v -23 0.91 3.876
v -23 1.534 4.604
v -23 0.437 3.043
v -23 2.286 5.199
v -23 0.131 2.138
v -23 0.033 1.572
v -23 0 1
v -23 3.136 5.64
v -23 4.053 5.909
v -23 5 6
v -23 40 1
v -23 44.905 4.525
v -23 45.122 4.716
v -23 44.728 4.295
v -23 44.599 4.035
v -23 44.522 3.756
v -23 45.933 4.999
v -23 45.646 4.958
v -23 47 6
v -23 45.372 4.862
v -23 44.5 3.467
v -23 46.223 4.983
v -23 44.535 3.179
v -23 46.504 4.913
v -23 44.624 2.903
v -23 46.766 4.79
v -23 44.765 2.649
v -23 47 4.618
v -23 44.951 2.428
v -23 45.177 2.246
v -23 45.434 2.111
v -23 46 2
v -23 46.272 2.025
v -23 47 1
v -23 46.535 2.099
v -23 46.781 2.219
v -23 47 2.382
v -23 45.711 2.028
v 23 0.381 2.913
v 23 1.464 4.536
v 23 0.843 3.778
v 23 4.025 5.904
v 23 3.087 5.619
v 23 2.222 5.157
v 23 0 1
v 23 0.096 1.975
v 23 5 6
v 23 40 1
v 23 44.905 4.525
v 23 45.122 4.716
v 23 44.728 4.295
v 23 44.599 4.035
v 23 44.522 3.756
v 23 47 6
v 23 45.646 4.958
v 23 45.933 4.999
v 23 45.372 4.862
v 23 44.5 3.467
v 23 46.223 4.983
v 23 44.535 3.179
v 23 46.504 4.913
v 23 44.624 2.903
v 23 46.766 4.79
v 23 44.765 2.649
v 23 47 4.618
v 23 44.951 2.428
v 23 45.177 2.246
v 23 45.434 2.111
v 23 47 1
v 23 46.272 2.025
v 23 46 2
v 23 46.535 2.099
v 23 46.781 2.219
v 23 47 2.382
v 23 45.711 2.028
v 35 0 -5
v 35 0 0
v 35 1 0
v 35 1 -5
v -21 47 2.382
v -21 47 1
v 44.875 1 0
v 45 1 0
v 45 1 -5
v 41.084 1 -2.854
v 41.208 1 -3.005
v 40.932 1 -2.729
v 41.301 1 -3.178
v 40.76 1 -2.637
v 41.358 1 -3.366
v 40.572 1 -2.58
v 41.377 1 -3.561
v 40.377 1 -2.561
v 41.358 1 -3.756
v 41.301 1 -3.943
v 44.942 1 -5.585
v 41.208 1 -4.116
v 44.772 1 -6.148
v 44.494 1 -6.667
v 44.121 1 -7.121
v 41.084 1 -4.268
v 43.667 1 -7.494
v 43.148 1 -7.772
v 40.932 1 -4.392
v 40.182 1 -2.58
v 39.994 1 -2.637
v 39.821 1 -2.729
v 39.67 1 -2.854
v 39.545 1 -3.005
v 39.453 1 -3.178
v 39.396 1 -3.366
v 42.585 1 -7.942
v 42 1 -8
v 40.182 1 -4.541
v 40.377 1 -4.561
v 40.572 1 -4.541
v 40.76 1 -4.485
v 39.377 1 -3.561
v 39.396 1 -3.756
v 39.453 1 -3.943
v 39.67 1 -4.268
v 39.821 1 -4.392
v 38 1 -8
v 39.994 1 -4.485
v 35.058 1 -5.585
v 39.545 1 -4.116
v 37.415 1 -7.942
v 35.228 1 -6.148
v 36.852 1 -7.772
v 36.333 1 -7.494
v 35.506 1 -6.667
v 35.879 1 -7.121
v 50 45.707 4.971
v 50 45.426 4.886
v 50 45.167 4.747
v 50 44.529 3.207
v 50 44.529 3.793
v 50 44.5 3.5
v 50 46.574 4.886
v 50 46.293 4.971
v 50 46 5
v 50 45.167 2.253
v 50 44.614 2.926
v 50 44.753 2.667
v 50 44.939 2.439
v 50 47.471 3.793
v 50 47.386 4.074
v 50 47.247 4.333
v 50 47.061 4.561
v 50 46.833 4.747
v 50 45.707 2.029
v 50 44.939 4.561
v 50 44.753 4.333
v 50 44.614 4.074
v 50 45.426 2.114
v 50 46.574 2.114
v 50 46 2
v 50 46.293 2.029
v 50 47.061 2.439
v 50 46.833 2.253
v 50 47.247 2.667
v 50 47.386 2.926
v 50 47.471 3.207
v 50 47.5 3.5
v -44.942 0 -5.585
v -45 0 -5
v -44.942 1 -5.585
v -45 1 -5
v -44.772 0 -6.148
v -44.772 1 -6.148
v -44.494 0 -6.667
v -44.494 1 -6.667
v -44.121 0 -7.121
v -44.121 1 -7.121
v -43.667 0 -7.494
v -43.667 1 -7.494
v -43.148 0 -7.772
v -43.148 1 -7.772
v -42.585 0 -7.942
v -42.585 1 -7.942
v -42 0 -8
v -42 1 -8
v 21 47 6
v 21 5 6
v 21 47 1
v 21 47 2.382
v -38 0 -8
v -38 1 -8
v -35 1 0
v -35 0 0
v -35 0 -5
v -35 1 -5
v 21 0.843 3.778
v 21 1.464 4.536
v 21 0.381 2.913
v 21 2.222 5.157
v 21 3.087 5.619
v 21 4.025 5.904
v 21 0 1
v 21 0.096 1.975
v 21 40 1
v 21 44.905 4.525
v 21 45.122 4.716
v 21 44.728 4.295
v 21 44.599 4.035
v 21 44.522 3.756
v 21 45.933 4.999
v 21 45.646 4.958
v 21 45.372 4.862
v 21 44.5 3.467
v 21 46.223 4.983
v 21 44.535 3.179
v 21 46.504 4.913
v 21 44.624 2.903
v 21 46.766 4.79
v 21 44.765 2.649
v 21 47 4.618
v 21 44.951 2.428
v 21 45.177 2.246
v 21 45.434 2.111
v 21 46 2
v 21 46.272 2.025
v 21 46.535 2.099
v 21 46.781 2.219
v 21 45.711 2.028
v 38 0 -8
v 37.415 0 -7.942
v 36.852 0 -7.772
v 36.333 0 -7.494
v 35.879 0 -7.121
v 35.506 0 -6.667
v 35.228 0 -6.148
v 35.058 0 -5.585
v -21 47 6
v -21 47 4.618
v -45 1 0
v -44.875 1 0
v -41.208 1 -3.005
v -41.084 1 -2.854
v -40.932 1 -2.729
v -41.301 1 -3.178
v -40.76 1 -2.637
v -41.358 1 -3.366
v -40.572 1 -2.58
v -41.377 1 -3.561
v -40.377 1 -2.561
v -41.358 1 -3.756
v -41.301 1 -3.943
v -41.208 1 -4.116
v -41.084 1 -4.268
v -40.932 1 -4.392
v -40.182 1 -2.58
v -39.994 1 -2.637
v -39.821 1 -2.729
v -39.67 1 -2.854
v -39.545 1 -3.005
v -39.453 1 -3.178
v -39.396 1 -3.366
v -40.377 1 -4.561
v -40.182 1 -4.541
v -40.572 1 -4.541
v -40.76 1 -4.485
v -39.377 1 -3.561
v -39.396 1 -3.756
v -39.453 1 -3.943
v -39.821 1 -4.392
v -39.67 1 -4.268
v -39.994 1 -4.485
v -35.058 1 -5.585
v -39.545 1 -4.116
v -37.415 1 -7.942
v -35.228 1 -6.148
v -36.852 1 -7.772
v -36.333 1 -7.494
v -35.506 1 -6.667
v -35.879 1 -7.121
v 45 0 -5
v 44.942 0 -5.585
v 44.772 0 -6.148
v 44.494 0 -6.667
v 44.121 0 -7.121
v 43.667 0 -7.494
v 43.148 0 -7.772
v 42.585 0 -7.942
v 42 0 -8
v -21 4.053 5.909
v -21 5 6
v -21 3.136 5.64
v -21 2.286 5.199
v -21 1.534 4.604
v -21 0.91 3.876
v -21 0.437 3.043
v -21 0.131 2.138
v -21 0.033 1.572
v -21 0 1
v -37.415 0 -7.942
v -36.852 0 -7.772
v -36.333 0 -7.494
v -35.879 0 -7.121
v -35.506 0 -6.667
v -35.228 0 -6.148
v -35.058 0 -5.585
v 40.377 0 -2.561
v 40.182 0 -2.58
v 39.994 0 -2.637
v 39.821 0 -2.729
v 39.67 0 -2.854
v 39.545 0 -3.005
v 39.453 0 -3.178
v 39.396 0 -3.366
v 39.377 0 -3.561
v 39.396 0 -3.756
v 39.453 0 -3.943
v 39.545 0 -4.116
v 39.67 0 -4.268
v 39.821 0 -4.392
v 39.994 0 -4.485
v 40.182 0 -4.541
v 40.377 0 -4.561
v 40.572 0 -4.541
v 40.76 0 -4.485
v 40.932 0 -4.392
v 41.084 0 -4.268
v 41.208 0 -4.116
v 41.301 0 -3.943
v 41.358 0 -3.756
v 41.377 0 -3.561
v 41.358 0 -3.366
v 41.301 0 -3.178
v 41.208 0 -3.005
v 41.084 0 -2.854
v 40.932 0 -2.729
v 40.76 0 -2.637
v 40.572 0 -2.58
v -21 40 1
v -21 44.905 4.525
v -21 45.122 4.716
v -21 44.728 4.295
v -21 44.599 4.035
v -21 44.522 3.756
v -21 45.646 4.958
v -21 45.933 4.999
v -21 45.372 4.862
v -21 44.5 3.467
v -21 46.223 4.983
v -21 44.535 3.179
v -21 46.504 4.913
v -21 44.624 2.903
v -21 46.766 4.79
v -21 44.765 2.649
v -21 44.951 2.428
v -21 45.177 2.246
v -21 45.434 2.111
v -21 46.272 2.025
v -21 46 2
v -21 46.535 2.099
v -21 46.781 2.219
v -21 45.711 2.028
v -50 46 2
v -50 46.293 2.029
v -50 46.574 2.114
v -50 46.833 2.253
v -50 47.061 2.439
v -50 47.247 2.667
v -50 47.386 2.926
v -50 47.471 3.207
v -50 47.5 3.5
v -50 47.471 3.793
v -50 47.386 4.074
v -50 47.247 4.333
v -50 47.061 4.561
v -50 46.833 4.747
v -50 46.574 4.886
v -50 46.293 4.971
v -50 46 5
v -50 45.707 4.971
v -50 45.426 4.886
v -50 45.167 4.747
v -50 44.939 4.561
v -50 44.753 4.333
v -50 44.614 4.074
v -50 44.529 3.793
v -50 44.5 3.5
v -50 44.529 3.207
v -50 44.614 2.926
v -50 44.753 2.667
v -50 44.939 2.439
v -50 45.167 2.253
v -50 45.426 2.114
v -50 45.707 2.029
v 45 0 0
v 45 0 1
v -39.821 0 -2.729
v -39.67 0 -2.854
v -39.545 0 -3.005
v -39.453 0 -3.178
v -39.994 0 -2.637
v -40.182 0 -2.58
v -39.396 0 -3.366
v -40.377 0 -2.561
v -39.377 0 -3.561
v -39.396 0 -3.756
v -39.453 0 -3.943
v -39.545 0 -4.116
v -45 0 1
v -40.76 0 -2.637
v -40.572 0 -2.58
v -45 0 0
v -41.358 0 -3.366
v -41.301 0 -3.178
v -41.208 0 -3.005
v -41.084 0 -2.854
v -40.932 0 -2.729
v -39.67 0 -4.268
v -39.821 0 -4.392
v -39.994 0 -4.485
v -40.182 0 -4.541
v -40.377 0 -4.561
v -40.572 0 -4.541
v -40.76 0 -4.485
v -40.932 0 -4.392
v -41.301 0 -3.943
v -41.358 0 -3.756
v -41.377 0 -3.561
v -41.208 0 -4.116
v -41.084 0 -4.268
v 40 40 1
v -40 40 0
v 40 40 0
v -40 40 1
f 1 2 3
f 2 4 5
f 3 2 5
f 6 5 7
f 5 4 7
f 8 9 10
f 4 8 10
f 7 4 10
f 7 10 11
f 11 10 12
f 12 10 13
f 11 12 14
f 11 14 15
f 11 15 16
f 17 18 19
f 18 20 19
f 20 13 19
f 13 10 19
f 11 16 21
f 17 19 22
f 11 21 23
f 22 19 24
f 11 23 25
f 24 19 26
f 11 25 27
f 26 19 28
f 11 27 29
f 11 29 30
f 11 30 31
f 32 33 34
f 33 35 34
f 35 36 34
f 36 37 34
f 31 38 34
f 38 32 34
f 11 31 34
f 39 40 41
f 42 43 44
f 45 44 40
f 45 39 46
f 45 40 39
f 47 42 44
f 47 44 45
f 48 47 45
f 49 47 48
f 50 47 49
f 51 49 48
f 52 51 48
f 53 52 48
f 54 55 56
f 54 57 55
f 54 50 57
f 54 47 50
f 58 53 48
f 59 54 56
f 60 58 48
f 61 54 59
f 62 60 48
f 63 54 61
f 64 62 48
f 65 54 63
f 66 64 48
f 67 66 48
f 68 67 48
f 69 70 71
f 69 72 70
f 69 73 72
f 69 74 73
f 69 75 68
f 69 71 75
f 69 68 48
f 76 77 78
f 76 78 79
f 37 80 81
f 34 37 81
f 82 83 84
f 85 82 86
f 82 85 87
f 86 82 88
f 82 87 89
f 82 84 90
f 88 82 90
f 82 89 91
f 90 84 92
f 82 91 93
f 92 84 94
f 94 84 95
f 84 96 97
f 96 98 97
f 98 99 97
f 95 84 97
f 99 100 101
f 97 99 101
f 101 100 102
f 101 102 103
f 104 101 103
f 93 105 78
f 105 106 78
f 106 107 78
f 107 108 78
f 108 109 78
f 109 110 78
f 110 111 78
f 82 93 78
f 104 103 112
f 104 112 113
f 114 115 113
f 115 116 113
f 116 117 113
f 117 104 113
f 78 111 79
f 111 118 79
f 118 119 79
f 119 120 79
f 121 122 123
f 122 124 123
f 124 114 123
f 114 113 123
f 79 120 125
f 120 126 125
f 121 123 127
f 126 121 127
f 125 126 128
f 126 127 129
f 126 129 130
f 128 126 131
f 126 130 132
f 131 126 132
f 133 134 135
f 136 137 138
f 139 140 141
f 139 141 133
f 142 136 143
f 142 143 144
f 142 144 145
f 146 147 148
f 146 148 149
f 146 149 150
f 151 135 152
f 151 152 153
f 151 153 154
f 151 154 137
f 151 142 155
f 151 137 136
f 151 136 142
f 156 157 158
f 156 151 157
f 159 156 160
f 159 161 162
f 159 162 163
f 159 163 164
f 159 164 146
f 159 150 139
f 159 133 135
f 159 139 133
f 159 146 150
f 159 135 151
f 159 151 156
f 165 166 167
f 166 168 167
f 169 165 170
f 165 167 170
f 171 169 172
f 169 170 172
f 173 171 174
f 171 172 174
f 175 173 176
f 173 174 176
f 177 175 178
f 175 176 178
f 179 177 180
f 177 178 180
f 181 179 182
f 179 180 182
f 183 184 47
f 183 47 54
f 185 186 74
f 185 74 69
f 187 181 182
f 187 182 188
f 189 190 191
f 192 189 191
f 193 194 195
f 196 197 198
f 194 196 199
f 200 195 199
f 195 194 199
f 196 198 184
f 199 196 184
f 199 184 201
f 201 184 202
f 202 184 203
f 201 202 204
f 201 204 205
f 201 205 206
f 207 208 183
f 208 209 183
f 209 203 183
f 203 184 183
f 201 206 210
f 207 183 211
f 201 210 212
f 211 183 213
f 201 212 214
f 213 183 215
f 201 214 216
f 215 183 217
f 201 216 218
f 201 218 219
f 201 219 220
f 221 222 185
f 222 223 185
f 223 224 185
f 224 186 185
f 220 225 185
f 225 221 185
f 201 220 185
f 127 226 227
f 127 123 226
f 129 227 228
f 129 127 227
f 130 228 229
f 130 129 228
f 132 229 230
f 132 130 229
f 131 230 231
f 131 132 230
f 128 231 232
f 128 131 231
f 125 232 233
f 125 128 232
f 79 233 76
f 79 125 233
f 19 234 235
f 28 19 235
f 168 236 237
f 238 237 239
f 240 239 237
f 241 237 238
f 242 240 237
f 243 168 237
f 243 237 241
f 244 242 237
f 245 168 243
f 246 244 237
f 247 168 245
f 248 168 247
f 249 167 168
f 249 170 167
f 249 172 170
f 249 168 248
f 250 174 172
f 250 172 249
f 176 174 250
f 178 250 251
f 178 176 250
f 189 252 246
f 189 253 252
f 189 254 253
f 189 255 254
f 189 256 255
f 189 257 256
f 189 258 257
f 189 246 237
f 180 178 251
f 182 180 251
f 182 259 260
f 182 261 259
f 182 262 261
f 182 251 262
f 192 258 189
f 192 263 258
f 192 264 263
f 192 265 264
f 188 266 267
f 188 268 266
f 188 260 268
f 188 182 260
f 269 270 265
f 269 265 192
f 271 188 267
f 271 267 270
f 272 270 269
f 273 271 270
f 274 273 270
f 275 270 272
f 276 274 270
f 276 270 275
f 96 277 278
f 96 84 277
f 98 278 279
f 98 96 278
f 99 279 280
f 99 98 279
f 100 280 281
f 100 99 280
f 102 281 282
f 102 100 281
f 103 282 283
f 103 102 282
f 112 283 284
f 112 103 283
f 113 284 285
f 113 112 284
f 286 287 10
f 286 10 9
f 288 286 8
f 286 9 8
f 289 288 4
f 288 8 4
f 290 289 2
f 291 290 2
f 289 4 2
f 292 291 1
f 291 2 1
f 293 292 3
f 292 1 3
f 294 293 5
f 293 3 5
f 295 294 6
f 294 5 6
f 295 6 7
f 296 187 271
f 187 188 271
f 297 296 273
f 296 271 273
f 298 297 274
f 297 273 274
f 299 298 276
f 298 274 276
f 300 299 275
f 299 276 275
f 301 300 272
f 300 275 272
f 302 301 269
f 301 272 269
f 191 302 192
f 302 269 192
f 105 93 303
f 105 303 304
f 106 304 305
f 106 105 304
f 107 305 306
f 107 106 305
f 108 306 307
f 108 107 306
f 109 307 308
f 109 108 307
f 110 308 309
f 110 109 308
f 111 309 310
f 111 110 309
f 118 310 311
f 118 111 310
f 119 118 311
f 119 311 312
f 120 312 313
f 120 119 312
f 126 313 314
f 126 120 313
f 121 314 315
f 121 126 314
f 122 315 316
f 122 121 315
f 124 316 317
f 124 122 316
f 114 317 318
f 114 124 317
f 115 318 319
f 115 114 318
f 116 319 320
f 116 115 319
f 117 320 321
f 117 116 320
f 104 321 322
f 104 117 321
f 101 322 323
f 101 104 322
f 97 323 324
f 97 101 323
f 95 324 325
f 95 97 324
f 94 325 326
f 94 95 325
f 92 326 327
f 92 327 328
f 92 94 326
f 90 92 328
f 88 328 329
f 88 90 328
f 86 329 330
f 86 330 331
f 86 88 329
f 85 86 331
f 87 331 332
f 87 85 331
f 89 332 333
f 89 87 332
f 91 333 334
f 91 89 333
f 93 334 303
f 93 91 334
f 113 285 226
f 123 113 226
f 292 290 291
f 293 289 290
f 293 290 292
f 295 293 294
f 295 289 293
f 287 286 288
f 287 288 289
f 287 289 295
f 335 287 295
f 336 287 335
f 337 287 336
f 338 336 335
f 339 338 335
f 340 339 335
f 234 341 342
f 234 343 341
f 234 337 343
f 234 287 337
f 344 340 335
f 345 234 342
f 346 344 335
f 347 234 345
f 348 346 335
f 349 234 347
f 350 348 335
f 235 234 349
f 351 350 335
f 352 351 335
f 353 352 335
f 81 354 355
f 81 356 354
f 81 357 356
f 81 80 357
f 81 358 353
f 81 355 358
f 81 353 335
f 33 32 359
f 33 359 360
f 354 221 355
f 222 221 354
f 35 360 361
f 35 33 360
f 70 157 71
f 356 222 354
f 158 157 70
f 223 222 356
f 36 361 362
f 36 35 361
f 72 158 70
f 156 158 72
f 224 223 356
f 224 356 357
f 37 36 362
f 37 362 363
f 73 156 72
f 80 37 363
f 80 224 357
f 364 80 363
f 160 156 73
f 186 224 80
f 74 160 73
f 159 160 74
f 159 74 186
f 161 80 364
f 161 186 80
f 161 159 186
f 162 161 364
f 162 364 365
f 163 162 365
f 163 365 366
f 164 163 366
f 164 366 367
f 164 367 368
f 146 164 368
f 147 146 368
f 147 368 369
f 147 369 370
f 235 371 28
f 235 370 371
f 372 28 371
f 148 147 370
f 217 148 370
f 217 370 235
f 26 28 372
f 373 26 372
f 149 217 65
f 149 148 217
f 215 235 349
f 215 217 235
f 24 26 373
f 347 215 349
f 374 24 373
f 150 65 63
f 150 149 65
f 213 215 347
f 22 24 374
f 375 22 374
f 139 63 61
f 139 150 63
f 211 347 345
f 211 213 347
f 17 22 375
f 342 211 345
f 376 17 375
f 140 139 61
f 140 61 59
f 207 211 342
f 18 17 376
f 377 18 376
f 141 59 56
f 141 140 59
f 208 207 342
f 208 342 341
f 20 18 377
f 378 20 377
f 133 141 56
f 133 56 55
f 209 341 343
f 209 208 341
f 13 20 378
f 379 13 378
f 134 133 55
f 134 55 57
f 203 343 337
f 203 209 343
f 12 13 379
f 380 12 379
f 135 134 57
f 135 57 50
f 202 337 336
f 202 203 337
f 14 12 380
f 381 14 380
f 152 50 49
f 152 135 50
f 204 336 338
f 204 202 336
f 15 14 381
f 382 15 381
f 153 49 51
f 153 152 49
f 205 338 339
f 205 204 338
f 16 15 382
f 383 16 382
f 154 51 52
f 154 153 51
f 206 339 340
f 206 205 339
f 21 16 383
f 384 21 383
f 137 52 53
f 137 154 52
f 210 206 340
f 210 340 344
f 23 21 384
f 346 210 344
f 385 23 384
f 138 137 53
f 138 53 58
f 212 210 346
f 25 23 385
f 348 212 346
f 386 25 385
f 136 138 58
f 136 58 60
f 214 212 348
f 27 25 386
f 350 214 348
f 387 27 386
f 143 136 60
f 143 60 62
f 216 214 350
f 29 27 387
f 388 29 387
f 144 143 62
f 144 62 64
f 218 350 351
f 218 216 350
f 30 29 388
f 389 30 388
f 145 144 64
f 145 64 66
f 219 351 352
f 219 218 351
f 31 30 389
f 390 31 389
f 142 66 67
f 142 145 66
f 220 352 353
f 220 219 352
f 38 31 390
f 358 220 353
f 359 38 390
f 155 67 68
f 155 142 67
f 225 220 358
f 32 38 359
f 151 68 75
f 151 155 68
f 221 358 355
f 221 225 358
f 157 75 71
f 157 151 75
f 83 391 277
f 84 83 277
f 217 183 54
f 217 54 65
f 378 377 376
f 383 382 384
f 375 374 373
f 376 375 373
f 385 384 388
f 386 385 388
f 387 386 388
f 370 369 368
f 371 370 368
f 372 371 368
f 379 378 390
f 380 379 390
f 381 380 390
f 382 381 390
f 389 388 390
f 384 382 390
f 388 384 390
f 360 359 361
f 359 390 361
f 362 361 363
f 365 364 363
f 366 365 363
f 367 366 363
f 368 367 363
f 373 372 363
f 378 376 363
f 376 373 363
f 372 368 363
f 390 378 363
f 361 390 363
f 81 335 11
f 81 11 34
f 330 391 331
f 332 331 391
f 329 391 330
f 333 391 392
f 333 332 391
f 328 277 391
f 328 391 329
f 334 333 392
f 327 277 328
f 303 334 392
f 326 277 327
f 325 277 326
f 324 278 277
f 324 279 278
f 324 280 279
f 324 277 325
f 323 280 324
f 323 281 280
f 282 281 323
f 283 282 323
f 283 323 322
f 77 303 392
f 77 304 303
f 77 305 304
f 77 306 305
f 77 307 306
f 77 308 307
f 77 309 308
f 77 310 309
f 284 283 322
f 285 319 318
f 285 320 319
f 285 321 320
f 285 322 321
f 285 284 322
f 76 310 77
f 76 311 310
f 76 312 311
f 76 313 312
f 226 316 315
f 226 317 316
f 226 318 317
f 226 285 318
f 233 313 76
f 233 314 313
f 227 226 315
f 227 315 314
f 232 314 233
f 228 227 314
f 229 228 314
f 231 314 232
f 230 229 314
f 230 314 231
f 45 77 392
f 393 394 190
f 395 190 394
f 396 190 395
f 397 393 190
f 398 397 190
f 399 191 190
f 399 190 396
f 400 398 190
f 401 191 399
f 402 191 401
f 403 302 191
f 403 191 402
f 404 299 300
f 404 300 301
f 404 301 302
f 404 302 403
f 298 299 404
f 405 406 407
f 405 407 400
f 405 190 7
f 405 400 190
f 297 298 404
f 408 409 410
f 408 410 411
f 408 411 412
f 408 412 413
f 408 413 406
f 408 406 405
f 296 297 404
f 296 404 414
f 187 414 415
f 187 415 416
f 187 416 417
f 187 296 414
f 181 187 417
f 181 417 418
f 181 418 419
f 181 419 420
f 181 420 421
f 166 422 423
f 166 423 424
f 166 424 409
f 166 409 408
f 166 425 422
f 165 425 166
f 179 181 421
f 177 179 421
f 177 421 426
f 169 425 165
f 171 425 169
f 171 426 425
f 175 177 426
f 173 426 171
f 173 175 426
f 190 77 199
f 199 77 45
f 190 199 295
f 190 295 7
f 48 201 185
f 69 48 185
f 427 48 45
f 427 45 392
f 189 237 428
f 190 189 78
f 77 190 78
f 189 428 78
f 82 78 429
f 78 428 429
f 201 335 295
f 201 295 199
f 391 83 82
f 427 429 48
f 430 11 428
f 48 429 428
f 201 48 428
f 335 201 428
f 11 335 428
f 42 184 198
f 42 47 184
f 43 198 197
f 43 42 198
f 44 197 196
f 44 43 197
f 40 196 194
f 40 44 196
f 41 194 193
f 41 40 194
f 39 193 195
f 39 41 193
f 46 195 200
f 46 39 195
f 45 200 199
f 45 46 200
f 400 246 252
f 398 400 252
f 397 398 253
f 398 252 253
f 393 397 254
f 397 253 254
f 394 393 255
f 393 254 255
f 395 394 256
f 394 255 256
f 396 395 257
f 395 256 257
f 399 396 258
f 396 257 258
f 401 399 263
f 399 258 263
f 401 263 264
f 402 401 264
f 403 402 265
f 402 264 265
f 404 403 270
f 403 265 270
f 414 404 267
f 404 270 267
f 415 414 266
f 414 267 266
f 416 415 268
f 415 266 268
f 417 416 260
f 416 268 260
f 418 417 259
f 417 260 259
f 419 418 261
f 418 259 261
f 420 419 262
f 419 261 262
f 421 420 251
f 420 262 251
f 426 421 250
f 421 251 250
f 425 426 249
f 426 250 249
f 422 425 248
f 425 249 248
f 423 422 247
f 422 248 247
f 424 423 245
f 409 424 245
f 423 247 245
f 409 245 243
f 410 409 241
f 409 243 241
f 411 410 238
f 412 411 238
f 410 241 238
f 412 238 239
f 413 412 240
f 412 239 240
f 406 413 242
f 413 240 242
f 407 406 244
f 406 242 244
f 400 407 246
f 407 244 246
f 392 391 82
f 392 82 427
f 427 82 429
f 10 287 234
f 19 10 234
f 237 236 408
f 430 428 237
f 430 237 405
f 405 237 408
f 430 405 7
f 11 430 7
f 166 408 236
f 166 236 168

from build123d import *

# Parameters (mm, degrees)
BOSS_EXTRUDE2_DEPTH  = 1
SKETCH2_W            = 5
SKETCH2_H            = 47
BOSS_EXTRUDE3_DEPTH  = 2
FILLET2_R            = 5
FILLET2_OF_MIRROR2_R = 5
SKETCH3_R            = 1.5
BOSS_EXTRUDE5_DEPTH  = 100
SKETCH5_W            = 10
SKETCH5_H            = 8
BOSS_EXTRUDE6_DEPTH  = 1
FILLET3_R            = 3
SKETCH6_R            = 1
CUT_EXTRUDE1_DEPTH   = 1
FILLET3_OF_MIRROR4_R = 3


with BuildPart() as part:
    # Sketch1 → Boss-Extrude2 (new body)
    with BuildSketch(Plane.XY):
        Polygon((-45, 0), (45, 0), (40, 40), (-40, 40), align=None)
    extrude(amount=BOSS_EXTRUDE2_DEPTH)

    # Sketch2 → Boss-Extrude3 (add)
    with BuildSketch(Plane(origin=(21, 0, 0), x_dir=(0, 0, -1), z_dir=(1, 0, 0))):
        with Locations((-3.5, 23.5)):
            Rectangle(SKETCH2_W, SKETCH2_H)
    boss_extrude3 = extrude(amount=BOSS_EXTRUDE3_DEPTH)

    # Fillet2
    fillet2_edges = [part.edges().sort_by_distance(p)[0] for p in [
        (22, 0, 6),
    ]]
    fillet(fillet2_edges, radius=FILLET2_R)

    # Mirror2: Boss-Extrude3 across plane
    add(boss_extrude3.mirror(Plane(origin=(0, 0, 0), x_dir=(0, 0, 1), z_dir=(1, 0, 0))))

    # Fillet2 of Mirror2
    fillet2_of_mirror2_edges = [part.edges().sort_by_distance(p)[0] for p in [
        (-22, 0, 6),
    ]]
    fillet(fillet2_of_mirror2_edges, radius=FILLET2_OF_MIRROR2_R)

    # Sketch3 → Boss-Extrude5 (add)
    with BuildSketch(Plane(origin=(50, 0, 0), x_dir=(0, 0, -1), z_dir=(1, 0, 0))):
        with Locations((-3.5, 46)):
            Circle(SKETCH3_R)
    extrude(amount=-BOSS_EXTRUDE5_DEPTH)

    # Sketch5 → Boss-Extrude6 (add)
    with BuildSketch(Plane(origin=(0, 0, 0), x_dir=(1, 0, 0), z_dir=(0, 1, 0))):
        with Locations((-40, 4)):
            Rectangle(SKETCH5_W, SKETCH5_H)
    boss_extrude6 = extrude(amount=BOSS_EXTRUDE6_DEPTH)

    # Fillet3
    fillet3_edges = [part.edges().sort_by_distance(p)[0] for p in [
        (-35, 0.5, -8),
        (-45, 0.5, -8),
    ]]
    fillet(fillet3_edges, radius=FILLET3_R)

    # Sketch6 → Cut-Extrude1 (cut)
    with BuildSketch(Plane(origin=(0, 1, 0), x_dir=(1, 0, 0), z_dir=(0, 1, 0))):
        with Locations(Location((-40.376839828, 3.560660172, 0), (0, 0, 270))):
            Circle(SKETCH6_R)
    cut_extrude1 = extrude(amount=-CUT_EXTRUDE1_DEPTH, mode=Mode.SUBTRACT)

    # Mirror4: Boss-Extrude6, Cut-Extrude1 across plane
    add(boss_extrude6.mirror(Plane(origin=(0, 0, 0), x_dir=(0, 0, 1), z_dir=(1, 0, 0))))
    add(cut_extrude1.mirror(Plane(origin=(0, 0, 0), x_dir=(0, 0, 1), z_dir=(1, 0, 0))), mode=Mode.SUBTRACT)

    # Fillet3 of Mirror4
    fillet3_of_mirror4_edges = [part.edges().sort_by_distance(p)[0] for p in [
        (35, 0.5, -8),
        (45, 0.5, -8),
    ]]
    fillet(fillet3_of_mirror4_edges, radius=FILLET3_OF_MIRROR4_R)


solid = part.part
